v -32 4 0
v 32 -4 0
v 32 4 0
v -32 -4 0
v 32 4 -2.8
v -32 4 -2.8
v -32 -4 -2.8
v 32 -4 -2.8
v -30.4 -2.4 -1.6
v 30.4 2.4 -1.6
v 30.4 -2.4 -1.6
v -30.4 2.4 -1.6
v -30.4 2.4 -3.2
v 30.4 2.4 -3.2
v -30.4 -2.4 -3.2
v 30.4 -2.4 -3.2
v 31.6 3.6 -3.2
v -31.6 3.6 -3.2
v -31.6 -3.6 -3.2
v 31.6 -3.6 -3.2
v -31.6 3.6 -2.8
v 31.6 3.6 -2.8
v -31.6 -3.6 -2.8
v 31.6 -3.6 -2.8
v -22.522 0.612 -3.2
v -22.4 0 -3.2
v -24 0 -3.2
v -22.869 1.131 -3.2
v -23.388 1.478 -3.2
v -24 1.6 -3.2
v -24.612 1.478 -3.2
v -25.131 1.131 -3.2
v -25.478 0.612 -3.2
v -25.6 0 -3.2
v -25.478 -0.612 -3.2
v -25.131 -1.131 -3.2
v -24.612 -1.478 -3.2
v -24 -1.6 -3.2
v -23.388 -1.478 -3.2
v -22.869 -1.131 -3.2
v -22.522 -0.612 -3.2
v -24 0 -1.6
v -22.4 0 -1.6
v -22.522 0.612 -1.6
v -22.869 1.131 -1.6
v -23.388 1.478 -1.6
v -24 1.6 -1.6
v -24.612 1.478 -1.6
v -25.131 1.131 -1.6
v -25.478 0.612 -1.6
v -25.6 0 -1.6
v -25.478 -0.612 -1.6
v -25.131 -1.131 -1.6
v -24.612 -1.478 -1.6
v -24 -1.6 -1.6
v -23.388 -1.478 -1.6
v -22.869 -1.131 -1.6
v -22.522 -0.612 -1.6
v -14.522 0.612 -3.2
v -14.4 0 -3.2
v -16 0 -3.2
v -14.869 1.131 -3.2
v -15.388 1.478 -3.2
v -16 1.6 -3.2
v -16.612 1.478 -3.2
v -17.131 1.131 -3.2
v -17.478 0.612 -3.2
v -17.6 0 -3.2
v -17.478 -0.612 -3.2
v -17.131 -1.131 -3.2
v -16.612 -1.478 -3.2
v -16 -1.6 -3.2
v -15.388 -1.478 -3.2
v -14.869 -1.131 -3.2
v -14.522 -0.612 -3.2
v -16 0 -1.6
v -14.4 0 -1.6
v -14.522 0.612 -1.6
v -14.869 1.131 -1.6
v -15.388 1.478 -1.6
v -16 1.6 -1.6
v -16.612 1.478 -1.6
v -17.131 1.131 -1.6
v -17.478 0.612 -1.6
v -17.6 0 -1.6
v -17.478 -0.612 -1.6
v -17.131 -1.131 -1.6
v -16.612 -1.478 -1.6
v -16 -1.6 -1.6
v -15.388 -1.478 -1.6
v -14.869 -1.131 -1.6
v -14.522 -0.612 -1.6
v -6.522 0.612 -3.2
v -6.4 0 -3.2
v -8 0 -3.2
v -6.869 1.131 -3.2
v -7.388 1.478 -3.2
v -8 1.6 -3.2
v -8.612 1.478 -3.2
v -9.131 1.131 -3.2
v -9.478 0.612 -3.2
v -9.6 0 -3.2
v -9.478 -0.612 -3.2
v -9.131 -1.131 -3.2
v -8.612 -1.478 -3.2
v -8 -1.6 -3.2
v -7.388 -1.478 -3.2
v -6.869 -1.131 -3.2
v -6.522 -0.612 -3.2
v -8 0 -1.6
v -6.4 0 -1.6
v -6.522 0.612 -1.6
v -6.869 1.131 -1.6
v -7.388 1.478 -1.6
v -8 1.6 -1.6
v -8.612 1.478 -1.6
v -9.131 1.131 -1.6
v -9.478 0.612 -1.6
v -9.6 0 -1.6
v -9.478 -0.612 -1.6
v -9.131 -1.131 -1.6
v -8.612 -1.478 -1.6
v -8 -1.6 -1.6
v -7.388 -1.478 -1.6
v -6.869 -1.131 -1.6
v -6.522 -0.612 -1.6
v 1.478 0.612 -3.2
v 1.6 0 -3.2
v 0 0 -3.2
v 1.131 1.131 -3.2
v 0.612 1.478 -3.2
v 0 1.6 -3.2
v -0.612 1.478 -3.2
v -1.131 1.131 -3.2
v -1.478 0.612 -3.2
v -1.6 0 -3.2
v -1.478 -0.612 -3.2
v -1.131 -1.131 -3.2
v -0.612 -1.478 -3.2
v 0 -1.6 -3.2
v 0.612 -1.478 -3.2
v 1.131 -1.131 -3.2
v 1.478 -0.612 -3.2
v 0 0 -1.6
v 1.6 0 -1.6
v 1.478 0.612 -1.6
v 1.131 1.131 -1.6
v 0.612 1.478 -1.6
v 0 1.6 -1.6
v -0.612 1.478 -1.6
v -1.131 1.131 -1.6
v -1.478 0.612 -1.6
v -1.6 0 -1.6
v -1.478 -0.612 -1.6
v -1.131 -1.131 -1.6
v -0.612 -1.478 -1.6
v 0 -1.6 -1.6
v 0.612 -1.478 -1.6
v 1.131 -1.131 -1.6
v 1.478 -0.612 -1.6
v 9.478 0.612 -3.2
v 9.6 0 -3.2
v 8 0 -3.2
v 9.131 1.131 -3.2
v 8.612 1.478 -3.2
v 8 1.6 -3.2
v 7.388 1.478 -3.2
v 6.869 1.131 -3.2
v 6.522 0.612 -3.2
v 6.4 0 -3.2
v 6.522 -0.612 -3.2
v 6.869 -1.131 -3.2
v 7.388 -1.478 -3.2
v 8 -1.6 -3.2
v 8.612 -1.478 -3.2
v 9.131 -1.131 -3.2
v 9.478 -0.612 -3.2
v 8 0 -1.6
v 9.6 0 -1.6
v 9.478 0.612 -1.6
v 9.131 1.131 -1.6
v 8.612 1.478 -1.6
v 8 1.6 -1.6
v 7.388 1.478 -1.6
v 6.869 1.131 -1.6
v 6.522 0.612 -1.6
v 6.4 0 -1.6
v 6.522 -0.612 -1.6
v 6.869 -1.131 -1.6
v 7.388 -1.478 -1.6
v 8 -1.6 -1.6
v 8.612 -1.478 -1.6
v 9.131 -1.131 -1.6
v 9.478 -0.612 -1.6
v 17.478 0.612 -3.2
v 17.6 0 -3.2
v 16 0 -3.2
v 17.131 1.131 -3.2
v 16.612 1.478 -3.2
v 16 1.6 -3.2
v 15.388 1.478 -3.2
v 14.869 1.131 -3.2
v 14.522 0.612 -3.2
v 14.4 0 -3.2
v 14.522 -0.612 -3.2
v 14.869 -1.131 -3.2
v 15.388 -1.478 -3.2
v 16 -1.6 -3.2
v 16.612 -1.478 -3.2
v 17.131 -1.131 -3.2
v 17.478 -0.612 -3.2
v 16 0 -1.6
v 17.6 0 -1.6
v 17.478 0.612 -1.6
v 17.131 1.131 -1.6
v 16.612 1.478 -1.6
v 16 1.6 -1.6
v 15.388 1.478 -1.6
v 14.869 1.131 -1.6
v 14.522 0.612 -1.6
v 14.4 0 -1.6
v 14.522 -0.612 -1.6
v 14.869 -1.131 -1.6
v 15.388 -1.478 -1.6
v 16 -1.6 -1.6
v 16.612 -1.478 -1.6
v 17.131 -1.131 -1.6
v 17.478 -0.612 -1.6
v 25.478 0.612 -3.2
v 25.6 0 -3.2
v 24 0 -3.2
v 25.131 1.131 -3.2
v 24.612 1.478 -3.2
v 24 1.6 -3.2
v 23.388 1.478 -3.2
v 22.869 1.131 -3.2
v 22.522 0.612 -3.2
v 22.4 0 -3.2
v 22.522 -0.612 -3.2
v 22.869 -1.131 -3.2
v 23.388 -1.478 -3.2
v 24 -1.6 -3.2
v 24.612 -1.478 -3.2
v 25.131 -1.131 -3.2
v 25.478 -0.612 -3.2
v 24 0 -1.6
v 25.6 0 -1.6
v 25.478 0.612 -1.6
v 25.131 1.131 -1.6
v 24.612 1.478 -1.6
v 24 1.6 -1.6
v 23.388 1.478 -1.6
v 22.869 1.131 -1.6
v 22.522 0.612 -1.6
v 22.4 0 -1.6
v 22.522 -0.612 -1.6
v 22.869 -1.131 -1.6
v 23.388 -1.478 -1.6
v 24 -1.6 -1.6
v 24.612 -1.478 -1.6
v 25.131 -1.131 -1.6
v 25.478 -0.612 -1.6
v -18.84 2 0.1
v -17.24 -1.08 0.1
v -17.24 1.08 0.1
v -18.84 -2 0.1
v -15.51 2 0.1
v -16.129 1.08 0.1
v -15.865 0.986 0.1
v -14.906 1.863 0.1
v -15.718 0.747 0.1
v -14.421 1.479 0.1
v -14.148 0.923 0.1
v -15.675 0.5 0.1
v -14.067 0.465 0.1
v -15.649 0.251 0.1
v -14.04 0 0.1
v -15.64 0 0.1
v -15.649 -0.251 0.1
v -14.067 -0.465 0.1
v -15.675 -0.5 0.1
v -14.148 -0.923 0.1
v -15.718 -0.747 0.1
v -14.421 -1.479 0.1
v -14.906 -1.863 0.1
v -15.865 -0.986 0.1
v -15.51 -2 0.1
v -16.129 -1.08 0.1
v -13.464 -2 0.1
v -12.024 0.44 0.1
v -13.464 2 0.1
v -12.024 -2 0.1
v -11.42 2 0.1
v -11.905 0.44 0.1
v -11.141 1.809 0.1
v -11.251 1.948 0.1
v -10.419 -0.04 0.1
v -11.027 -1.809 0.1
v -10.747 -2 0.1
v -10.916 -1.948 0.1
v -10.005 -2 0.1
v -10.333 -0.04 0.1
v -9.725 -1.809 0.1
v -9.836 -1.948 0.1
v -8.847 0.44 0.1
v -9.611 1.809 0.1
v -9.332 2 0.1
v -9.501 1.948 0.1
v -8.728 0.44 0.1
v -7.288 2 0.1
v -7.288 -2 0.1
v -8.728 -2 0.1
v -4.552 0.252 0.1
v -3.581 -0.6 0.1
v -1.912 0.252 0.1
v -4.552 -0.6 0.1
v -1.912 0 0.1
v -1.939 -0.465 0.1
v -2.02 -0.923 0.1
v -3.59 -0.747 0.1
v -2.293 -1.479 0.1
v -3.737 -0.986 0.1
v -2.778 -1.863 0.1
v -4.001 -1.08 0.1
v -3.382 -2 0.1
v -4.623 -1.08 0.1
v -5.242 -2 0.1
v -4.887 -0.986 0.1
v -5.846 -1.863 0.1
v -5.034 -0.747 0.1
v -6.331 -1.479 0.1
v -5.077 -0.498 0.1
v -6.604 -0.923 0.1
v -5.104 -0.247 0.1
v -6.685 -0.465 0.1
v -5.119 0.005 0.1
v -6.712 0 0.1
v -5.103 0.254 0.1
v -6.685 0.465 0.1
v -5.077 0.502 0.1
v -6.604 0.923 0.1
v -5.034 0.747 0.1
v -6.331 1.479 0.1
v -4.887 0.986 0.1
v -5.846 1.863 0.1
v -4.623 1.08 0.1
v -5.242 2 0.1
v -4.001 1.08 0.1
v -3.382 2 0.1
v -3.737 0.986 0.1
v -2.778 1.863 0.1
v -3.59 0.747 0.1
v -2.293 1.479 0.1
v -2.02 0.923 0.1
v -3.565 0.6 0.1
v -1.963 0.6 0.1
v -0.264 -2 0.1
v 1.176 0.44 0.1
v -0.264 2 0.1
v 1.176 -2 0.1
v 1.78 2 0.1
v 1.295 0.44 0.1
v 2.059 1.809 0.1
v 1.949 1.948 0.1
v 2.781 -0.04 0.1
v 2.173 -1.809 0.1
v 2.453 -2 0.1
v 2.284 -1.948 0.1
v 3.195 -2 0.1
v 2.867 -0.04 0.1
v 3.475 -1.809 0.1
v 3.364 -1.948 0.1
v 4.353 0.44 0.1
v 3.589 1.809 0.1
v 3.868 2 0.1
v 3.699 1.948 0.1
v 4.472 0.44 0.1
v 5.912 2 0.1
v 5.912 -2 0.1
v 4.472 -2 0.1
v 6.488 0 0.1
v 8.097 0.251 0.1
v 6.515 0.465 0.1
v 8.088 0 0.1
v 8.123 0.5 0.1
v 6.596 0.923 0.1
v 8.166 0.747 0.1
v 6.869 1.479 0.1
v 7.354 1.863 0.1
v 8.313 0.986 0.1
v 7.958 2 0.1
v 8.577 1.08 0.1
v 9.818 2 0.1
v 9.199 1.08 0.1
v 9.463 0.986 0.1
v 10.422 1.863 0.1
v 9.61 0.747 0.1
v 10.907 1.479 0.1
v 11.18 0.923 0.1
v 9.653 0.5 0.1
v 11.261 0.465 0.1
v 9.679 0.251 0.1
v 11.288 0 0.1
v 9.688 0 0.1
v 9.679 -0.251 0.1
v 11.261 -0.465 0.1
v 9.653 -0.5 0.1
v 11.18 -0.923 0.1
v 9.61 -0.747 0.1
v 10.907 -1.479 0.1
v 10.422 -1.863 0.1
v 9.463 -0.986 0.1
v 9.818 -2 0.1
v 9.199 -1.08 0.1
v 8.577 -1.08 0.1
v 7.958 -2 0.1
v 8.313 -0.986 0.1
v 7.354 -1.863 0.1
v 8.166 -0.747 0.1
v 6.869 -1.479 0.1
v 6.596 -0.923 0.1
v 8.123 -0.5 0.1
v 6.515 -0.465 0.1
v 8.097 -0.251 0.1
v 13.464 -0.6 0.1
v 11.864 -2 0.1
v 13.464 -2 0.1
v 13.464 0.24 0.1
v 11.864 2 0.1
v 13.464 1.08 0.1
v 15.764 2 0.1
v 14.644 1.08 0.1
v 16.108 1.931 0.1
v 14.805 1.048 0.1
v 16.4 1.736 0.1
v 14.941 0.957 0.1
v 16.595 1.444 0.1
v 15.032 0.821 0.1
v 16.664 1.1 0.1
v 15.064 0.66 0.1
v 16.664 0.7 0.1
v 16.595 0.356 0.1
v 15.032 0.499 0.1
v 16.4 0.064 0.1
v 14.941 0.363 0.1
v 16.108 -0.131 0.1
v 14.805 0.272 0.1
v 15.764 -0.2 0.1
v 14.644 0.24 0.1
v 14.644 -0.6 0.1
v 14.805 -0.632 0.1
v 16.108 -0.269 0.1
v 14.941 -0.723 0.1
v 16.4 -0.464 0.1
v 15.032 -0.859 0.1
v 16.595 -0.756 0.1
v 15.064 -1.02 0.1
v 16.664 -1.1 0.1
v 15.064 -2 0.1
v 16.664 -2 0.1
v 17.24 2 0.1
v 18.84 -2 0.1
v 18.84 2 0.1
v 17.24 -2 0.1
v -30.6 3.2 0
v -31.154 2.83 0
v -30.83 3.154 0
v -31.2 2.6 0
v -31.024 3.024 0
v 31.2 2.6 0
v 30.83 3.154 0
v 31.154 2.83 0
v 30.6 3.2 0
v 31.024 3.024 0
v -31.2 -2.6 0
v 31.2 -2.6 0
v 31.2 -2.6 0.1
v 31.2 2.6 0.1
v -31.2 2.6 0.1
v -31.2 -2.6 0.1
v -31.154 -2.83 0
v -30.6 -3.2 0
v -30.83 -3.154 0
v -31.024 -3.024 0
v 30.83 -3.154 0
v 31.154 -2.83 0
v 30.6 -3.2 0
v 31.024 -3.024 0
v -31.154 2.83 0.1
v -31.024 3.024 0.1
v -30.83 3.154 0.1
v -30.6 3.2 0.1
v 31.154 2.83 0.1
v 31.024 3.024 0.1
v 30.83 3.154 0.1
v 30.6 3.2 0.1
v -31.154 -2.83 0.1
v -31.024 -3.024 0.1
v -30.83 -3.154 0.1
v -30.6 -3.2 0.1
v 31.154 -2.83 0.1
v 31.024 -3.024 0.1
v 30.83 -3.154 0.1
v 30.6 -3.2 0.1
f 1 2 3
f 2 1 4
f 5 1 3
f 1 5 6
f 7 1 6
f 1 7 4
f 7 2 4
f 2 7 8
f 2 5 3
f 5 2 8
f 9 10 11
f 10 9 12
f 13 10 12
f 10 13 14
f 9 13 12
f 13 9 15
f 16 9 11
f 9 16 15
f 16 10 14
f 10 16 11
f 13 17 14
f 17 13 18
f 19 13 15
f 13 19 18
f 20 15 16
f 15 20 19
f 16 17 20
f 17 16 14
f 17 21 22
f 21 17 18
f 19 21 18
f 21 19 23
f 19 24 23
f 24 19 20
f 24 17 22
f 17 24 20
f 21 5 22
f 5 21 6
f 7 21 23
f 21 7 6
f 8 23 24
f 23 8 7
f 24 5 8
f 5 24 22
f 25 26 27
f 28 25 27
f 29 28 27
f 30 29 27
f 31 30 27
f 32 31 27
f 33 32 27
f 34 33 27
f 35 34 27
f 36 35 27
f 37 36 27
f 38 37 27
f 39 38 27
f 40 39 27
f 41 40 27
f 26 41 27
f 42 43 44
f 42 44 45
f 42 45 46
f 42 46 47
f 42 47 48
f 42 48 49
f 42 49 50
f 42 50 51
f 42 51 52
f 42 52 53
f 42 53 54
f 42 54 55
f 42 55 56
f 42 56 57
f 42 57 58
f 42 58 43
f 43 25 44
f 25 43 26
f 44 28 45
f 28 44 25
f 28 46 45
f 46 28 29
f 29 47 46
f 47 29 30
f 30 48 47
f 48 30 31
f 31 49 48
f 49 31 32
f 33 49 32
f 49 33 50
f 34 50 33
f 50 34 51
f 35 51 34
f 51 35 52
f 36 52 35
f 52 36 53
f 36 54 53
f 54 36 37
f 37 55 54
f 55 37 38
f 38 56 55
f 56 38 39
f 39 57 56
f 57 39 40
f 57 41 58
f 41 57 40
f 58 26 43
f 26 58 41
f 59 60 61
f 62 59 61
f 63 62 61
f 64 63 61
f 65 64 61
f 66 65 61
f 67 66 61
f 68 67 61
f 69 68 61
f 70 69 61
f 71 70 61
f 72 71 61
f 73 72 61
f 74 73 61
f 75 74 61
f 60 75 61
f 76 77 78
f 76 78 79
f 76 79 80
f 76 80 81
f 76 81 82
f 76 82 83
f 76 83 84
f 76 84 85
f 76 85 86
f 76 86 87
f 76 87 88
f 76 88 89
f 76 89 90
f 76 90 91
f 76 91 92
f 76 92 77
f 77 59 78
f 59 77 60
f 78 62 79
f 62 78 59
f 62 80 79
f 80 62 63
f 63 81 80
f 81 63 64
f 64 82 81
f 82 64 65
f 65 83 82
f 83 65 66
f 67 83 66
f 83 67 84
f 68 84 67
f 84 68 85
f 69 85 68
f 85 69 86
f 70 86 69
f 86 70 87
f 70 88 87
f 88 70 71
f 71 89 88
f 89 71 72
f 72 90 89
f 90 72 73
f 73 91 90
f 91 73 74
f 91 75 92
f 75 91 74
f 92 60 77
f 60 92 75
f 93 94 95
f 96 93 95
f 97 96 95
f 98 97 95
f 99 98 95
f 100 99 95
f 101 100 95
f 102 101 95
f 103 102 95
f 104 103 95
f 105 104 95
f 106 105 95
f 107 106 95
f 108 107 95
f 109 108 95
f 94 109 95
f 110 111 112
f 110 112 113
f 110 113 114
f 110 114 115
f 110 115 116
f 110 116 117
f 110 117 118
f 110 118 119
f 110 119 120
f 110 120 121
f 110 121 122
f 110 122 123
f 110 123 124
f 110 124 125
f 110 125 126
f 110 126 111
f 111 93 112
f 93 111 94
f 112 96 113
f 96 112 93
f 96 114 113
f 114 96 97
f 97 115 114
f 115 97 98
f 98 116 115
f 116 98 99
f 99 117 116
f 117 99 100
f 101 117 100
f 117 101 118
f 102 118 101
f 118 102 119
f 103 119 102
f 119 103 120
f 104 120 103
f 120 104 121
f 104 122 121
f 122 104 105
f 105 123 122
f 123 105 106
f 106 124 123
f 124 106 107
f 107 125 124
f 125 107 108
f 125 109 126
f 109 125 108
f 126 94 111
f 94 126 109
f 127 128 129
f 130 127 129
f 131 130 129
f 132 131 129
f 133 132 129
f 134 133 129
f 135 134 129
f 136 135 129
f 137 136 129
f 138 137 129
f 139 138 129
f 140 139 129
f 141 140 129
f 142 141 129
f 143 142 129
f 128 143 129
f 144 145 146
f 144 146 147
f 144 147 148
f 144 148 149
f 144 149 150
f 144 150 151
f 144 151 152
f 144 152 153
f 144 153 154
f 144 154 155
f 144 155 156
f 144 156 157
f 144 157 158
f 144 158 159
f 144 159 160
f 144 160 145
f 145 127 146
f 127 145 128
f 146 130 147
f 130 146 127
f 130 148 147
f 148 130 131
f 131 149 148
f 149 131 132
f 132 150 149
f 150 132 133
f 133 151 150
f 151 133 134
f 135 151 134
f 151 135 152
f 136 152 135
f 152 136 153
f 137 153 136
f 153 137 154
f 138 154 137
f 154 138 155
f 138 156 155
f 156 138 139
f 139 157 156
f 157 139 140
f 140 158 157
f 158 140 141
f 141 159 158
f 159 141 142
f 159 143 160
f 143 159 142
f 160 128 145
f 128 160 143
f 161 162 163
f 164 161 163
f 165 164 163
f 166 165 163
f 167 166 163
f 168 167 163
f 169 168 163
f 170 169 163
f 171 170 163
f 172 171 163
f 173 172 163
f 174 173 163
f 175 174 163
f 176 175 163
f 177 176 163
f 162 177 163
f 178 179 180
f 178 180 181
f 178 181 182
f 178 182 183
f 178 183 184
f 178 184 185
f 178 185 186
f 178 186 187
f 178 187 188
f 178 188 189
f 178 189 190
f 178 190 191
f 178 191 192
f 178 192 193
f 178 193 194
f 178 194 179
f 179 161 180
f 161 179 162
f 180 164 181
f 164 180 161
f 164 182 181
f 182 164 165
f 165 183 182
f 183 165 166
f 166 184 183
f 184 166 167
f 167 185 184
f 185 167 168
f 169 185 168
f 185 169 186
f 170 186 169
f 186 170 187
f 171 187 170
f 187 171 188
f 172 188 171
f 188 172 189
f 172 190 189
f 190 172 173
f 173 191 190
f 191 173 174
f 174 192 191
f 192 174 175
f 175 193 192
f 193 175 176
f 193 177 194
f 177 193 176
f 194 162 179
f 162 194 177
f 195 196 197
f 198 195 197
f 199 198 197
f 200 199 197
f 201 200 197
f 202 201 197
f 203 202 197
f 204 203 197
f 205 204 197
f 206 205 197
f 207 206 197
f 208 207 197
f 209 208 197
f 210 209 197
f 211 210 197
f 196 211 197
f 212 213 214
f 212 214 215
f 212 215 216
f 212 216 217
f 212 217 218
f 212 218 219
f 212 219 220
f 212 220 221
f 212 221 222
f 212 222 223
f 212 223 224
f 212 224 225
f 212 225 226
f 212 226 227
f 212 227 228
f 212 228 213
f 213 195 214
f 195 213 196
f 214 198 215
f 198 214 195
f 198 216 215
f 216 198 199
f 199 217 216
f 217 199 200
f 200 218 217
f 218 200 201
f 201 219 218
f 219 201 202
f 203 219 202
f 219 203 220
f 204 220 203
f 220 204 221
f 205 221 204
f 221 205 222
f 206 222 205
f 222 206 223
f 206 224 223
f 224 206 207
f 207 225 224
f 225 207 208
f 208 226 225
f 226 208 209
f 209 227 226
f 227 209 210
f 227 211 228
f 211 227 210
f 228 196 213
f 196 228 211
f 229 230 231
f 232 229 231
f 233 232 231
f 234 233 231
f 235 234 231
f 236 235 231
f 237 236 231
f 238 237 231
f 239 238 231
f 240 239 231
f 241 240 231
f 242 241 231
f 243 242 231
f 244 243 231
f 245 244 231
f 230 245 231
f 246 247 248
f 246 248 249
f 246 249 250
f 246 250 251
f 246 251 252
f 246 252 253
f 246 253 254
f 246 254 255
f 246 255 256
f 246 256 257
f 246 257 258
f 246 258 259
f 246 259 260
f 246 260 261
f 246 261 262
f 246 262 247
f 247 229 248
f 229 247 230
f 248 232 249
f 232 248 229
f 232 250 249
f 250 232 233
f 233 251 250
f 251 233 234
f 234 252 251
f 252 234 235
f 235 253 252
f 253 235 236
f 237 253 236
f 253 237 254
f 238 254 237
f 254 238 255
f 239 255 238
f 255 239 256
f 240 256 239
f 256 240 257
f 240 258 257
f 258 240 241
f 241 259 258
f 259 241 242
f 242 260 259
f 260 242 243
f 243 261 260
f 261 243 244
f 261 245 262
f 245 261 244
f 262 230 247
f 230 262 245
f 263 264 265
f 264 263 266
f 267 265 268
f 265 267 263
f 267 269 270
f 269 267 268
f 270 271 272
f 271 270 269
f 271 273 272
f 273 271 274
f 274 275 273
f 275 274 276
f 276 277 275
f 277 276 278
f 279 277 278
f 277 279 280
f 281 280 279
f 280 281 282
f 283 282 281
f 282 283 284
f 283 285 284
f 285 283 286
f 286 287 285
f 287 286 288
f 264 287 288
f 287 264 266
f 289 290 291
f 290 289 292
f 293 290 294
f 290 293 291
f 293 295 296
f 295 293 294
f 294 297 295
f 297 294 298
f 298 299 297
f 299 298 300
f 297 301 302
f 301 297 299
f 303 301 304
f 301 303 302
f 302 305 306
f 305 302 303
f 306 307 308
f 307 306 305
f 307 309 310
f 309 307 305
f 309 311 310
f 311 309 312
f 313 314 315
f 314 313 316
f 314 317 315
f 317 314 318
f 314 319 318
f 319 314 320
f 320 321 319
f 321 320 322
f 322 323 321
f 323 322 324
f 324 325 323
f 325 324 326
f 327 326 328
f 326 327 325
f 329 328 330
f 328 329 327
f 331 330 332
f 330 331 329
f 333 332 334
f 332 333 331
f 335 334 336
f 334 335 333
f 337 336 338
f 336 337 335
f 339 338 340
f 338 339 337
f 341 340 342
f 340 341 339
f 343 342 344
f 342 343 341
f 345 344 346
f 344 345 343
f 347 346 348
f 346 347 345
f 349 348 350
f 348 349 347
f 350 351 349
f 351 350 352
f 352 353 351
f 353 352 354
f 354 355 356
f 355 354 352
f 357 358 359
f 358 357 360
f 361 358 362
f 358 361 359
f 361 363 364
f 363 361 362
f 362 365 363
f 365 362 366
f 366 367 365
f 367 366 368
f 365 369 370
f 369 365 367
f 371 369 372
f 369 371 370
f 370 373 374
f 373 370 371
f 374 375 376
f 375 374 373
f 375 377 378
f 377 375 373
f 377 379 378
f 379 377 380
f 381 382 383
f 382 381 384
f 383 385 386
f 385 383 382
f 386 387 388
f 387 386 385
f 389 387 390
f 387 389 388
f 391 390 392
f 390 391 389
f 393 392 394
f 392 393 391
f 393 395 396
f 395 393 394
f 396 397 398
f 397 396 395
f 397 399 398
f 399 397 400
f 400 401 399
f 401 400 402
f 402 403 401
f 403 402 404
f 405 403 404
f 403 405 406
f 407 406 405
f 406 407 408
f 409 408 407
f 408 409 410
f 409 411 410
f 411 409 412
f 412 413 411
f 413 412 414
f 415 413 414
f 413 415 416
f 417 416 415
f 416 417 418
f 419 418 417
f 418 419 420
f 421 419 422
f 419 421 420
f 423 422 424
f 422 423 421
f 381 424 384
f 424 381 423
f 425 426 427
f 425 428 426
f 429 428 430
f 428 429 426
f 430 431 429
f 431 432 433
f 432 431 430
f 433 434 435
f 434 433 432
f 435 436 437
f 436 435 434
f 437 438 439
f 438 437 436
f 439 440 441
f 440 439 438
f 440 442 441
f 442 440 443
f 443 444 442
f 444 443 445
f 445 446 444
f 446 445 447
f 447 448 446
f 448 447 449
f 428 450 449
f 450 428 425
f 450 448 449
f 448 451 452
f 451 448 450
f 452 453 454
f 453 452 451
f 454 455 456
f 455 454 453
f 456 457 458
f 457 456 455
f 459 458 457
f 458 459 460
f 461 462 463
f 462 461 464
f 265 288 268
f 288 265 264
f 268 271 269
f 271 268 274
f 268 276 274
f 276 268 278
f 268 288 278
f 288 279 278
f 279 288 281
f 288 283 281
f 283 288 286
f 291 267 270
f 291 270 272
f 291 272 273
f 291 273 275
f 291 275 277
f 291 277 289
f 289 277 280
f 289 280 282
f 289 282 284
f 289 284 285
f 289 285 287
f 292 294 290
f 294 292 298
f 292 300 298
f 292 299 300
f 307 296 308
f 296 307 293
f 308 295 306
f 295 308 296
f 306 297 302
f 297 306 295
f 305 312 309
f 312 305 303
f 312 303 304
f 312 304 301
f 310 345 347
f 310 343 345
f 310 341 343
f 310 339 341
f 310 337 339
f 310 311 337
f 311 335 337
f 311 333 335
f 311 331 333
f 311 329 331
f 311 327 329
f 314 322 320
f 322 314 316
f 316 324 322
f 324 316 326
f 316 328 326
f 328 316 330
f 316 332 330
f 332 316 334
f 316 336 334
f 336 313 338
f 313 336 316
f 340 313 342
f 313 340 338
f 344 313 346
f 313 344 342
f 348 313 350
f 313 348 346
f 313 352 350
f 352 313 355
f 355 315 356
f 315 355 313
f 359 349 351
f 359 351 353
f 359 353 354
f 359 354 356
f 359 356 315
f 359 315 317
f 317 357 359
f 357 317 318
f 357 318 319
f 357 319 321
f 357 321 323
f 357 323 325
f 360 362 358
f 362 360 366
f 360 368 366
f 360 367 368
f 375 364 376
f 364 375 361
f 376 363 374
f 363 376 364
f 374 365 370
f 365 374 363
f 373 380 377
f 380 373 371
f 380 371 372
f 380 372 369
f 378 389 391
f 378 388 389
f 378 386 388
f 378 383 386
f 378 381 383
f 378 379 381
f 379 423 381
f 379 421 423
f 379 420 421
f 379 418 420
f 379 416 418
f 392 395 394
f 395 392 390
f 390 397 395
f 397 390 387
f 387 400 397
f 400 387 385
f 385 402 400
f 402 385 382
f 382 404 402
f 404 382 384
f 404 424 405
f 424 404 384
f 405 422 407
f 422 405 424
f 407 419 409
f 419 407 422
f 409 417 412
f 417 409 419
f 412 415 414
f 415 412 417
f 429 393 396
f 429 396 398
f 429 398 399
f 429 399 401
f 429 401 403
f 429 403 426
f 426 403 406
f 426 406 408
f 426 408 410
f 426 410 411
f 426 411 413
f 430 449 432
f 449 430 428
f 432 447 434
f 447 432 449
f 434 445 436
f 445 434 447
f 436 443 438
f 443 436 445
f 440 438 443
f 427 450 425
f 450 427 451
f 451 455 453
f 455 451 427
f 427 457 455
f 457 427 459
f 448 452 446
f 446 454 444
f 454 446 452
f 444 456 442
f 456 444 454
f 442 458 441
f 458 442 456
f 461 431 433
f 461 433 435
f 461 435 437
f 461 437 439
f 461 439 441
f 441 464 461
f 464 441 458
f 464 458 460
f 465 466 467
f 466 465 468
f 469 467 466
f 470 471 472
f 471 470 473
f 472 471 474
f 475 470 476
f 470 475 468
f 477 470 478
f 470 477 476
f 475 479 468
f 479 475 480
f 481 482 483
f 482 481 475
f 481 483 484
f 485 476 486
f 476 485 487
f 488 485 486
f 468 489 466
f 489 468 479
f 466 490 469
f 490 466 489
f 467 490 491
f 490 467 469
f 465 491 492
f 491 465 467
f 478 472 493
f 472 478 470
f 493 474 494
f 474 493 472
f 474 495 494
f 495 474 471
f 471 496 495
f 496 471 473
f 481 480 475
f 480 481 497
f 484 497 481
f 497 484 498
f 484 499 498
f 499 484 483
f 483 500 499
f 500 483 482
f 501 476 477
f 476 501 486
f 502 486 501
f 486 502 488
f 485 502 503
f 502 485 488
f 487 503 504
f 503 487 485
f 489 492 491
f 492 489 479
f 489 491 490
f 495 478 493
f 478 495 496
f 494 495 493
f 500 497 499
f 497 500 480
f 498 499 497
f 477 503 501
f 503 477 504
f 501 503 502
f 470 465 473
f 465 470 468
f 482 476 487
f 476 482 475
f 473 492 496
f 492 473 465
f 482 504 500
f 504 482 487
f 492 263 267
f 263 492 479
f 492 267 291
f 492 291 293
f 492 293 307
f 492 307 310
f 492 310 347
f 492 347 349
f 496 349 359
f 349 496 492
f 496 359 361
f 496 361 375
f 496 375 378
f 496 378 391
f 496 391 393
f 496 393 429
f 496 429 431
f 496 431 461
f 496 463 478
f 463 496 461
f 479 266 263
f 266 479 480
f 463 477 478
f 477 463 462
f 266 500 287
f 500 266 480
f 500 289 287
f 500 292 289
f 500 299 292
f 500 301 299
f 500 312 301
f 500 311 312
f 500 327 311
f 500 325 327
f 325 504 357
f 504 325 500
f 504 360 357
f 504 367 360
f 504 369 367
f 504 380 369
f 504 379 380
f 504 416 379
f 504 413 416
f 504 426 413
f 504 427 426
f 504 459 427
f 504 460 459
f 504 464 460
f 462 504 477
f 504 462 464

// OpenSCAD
use <../lib.scad>
use <4162.scad>
use <6148328l.scad>
function ldraw_lib__4162d0g() = [
// 0 Tile  1 x  8 with White DMG MORI Logo on Dark Grey Background Sticker
// 0 Name: 4162d0g.dat
// 0 Author: Vincent Messenet [Cheenzo]
// 0 !LDRAW_ORG Shortcut UPDATE 2026-05
// 0 !LICENSE Licensed under CC BY 4.0 : see CAreadme.txt
// 
// 0 BFC CERTIFY CCW
  [0,"BFC","CERTIFY"],
  [0,"BFC","CCW"],
// 
// 0 !CATEGORY Sticker Shortcut
// 
// 0 !KEYWORDS Bricklink 4162pb196, Porsche 919 Hybrid and 917K Pit Lane, set 75876
// 0 !KEYWORDS Speed Champions
// 
// 0 !HISTORY 2026-05-31 [OrionP] Official Update 2026-05
// 
// 1 16 0 0 0 1 0 0 0 1 0 0 0 1 4162.dat
  [1,16,0,0,0,1,0,0,0,1,0,0,0,1, ldraw_lib__4162()],
// 1 16 0 0 0 1 0 0 0 1 0 0 0 1 6148328l.dat
  [1,16,0,0,0,1,0,0,0,1,0,0,0,1, ldraw_lib__6148328l()],
];
module ldraw_lib__4162d0g(step=0, col=false, unit=2/5, alt=false, line=0.2, solid=!$preview)
    makepoly(ldraw_lib__4162d0g(), step=step, col=col, unit=unit, alt=alt, line=line, solid=solid);
ldraw_lib__4162d0g(line=0.2);
